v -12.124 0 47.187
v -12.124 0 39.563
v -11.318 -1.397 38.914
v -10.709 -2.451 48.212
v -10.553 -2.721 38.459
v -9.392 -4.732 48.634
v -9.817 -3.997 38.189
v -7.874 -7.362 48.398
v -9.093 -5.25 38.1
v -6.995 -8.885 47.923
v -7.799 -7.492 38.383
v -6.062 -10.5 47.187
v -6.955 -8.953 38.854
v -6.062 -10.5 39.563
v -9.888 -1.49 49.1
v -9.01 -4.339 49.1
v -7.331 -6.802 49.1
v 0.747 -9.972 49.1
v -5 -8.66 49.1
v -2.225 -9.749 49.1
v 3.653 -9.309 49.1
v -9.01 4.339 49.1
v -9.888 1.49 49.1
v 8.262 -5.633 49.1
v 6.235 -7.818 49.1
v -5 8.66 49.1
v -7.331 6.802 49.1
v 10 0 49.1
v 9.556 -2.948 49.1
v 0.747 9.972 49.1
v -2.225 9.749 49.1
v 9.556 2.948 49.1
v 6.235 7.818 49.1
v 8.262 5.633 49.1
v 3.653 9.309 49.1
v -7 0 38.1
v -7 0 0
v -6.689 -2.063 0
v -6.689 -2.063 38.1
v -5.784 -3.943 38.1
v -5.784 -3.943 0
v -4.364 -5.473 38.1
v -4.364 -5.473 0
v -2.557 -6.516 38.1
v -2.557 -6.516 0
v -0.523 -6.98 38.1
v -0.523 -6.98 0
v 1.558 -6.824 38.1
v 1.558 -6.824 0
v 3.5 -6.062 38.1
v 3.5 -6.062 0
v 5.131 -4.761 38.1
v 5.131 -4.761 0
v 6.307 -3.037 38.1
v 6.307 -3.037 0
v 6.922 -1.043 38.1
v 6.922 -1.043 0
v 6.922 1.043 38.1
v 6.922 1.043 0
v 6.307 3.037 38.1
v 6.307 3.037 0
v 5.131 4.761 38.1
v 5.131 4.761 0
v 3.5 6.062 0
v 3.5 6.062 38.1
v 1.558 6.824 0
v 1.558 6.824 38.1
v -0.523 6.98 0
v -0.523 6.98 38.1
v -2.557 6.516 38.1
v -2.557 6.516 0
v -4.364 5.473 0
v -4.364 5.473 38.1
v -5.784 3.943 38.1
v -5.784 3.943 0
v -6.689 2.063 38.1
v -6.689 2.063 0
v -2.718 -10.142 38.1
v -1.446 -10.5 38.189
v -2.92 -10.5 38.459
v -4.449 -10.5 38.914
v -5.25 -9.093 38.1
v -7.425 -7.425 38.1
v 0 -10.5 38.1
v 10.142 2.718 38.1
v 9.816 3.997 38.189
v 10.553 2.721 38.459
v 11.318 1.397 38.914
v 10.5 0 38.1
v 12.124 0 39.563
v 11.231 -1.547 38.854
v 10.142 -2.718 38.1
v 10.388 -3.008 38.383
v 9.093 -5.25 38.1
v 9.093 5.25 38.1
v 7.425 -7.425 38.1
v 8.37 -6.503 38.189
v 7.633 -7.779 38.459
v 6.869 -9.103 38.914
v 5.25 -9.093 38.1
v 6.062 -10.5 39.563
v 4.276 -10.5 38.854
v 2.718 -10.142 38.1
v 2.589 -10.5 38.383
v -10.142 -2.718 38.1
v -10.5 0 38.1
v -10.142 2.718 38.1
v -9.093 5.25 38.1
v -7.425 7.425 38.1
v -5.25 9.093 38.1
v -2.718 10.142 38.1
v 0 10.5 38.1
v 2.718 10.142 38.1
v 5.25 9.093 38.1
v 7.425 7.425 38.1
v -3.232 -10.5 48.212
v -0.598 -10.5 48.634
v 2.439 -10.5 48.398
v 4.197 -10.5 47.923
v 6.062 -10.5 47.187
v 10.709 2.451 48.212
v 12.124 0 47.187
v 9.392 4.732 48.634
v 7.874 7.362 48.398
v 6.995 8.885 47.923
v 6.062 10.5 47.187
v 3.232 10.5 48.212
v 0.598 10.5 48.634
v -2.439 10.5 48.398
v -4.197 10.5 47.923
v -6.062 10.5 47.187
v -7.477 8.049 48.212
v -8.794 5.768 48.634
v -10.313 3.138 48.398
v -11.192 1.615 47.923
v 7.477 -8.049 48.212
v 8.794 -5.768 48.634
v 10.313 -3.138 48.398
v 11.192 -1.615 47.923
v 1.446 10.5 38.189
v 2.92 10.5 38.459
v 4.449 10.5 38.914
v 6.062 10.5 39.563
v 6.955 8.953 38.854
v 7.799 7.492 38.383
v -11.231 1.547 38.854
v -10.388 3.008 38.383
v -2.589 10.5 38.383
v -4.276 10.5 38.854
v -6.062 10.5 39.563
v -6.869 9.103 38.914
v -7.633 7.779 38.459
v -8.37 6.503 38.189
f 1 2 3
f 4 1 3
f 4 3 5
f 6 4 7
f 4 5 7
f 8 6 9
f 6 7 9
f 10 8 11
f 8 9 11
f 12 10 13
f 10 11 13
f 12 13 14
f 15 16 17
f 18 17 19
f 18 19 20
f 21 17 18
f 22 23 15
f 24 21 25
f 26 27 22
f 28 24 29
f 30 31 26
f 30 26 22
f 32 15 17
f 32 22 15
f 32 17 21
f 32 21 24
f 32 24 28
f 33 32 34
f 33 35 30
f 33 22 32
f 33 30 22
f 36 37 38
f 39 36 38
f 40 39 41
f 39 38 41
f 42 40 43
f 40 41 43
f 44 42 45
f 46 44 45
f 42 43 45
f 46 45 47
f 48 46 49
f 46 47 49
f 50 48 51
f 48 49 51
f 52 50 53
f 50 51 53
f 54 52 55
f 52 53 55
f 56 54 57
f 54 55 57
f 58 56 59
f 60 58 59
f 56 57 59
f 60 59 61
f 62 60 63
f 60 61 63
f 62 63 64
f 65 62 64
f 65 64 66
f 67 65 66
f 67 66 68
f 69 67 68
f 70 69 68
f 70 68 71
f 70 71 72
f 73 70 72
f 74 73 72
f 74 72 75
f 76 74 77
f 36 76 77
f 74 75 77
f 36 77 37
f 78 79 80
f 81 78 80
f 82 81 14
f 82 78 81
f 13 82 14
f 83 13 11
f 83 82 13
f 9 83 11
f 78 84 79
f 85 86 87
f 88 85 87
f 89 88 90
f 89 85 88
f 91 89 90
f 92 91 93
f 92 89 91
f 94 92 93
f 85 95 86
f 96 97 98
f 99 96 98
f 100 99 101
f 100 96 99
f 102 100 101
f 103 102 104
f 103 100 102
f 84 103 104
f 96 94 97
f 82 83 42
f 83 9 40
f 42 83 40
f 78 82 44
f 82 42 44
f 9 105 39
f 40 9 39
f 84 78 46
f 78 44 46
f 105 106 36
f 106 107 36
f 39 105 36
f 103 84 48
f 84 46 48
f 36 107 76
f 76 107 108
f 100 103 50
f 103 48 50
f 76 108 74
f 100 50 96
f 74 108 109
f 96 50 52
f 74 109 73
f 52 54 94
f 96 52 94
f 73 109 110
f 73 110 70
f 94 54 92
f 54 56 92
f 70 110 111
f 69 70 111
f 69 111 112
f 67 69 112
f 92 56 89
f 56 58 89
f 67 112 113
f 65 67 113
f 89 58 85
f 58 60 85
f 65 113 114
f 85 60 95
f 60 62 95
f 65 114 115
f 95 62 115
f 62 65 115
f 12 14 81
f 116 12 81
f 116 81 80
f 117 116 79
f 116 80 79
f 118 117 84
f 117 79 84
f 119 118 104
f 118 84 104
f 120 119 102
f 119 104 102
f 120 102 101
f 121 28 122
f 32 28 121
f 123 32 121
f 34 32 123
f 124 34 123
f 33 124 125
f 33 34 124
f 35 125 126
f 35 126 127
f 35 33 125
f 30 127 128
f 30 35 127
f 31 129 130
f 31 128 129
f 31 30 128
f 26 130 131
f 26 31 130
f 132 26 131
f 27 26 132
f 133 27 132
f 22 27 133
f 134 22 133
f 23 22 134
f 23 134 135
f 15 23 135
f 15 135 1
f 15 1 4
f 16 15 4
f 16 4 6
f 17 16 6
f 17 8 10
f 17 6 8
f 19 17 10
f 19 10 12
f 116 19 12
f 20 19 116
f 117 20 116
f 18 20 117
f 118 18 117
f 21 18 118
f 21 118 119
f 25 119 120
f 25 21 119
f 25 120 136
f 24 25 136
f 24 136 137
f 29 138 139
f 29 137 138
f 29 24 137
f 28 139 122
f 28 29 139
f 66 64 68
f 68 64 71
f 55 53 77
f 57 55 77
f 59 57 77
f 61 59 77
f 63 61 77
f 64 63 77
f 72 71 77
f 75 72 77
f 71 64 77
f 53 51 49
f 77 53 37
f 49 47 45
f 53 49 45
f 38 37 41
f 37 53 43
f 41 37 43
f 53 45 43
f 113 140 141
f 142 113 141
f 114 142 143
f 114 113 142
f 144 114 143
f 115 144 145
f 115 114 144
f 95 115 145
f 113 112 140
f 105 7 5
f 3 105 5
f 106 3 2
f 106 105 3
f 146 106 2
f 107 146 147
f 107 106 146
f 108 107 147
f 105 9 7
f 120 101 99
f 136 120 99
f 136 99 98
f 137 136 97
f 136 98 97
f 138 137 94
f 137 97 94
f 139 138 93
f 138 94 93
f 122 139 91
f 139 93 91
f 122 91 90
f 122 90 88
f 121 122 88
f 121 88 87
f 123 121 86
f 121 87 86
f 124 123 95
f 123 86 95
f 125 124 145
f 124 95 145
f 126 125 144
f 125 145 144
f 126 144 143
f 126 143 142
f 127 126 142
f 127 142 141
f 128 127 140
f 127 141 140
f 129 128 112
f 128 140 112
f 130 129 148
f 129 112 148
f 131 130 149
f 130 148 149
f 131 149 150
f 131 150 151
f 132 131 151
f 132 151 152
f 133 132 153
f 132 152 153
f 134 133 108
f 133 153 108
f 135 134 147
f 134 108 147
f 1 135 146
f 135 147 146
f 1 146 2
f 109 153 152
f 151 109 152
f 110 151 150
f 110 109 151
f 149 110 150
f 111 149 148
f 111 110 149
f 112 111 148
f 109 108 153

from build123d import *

# Parameters (mm, degrees)
CROQUIS1_R              = 7
SALIENTE_EXTRUIR1_DEPTH = 38.1
SALIENTE_EXTRUIR2_DEPTH = 11
CROQUIS3_R              = 27.5
CROQUIS3_R_2            = 10
CORTAR_EXTRUIR1_DEPTH   = 8
CORTAR_EXTRUIR1_DRAFT   = -48
CROQUIS4_R              = 37.959799744
CROQUIS4_R_2            = 10.5
CORTAR_EXTRUIR2_DEPTH   = 11
CORTAR_EXTRUIR2_DRAFT   = -48


with BuildPart() as part:
    # Croquis1 → Saliente-Extruir1 (new body)
    with BuildSketch(Plane.XY):
        with Locations(Location((0, 0, 0), (0, 0, 180))):
            Circle(CROQUIS1_R)
    extrude(amount=SALIENTE_EXTRUIR1_DEPTH)

    # Croquis2 → Saliente-Extruir2 (add)
    with BuildSketch(Plane.XY.offset(38.1)):
        Polygon((12.124355653, 0), (6.062177826, 10.5), (-6.062177826, 10.5), (-12.124355653, 0), (-6.062177826, -10.5), (6.062177826, -10.5), align=None)
    extrude(amount=SALIENTE_EXTRUIR2_DEPTH)


with BuildPart() as cortar_extruir1_tool:
    # Croquis3 → Cortar-Extruir1 (with draft: the straight prism first)
    with BuildSketch(Plane.XY.offset(49.1)):
        Circle(CROQUIS3_R)
        Circle(CROQUIS3_R_2, mode=Mode.SUBTRACT)
    extrude(amount=-CORTAR_EXTRUIR1_DEPTH)
    # Cortar-Extruir1: the draft: its side faces are tilted about the plane it starts from
    cortar_extruir1_sides = [cortar_extruir1_tool.faces().sort_by_distance(p)[0] for p in [
        (-27.5, 0, 45.1),
        (-10, 0, 45.1),
    ]]
    draft(cortar_extruir1_sides, Plane.XY.offset(49.1), CORTAR_EXTRUIR1_DRAFT)


with BuildPart() as part_1:
    add(part.part)

    # Cortar-Extruir1: cut by cortar_extruir1_tool
    add(cortar_extruir1_tool.part, mode=Mode.SUBTRACT)


with BuildPart() as cortar_extruir2_tool:
    # Croquis4 → Cortar-Extruir2 (with draft: the straight prism first)
    with BuildSketch(Plane(origin=(0, 0, 38.1), x_dir=(-1, 0, 0), z_dir=(0, 0, -1))):
        Circle(CROQUIS4_R)
        Circle(CROQUIS4_R_2, mode=Mode.SUBTRACT)
    extrude(amount=-CORTAR_EXTRUIR2_DEPTH)
    # Cortar-Extruir2: the draft: its side faces are tilted about the plane it starts from
    cortar_extruir2_sides = [cortar_extruir2_tool.faces().sort_by_distance(p)[0] for p in [
        (37.959799744, 0, 43.6),
        (10.5, 0, 43.6),
    ]]
    draft(cortar_extruir2_sides, Plane(origin=(0, 0, 38.1), x_dir=(-1, 0, 0), z_dir=(0, 0, -1)), CORTAR_EXTRUIR2_DRAFT)


with BuildPart() as part_2:
    add(part_1.part)

    # Cortar-Extruir2: cut by cortar_extruir2_tool
    add(cortar_extruir2_tool.part, mode=Mode.SUBTRACT)


solid = part_2.part
